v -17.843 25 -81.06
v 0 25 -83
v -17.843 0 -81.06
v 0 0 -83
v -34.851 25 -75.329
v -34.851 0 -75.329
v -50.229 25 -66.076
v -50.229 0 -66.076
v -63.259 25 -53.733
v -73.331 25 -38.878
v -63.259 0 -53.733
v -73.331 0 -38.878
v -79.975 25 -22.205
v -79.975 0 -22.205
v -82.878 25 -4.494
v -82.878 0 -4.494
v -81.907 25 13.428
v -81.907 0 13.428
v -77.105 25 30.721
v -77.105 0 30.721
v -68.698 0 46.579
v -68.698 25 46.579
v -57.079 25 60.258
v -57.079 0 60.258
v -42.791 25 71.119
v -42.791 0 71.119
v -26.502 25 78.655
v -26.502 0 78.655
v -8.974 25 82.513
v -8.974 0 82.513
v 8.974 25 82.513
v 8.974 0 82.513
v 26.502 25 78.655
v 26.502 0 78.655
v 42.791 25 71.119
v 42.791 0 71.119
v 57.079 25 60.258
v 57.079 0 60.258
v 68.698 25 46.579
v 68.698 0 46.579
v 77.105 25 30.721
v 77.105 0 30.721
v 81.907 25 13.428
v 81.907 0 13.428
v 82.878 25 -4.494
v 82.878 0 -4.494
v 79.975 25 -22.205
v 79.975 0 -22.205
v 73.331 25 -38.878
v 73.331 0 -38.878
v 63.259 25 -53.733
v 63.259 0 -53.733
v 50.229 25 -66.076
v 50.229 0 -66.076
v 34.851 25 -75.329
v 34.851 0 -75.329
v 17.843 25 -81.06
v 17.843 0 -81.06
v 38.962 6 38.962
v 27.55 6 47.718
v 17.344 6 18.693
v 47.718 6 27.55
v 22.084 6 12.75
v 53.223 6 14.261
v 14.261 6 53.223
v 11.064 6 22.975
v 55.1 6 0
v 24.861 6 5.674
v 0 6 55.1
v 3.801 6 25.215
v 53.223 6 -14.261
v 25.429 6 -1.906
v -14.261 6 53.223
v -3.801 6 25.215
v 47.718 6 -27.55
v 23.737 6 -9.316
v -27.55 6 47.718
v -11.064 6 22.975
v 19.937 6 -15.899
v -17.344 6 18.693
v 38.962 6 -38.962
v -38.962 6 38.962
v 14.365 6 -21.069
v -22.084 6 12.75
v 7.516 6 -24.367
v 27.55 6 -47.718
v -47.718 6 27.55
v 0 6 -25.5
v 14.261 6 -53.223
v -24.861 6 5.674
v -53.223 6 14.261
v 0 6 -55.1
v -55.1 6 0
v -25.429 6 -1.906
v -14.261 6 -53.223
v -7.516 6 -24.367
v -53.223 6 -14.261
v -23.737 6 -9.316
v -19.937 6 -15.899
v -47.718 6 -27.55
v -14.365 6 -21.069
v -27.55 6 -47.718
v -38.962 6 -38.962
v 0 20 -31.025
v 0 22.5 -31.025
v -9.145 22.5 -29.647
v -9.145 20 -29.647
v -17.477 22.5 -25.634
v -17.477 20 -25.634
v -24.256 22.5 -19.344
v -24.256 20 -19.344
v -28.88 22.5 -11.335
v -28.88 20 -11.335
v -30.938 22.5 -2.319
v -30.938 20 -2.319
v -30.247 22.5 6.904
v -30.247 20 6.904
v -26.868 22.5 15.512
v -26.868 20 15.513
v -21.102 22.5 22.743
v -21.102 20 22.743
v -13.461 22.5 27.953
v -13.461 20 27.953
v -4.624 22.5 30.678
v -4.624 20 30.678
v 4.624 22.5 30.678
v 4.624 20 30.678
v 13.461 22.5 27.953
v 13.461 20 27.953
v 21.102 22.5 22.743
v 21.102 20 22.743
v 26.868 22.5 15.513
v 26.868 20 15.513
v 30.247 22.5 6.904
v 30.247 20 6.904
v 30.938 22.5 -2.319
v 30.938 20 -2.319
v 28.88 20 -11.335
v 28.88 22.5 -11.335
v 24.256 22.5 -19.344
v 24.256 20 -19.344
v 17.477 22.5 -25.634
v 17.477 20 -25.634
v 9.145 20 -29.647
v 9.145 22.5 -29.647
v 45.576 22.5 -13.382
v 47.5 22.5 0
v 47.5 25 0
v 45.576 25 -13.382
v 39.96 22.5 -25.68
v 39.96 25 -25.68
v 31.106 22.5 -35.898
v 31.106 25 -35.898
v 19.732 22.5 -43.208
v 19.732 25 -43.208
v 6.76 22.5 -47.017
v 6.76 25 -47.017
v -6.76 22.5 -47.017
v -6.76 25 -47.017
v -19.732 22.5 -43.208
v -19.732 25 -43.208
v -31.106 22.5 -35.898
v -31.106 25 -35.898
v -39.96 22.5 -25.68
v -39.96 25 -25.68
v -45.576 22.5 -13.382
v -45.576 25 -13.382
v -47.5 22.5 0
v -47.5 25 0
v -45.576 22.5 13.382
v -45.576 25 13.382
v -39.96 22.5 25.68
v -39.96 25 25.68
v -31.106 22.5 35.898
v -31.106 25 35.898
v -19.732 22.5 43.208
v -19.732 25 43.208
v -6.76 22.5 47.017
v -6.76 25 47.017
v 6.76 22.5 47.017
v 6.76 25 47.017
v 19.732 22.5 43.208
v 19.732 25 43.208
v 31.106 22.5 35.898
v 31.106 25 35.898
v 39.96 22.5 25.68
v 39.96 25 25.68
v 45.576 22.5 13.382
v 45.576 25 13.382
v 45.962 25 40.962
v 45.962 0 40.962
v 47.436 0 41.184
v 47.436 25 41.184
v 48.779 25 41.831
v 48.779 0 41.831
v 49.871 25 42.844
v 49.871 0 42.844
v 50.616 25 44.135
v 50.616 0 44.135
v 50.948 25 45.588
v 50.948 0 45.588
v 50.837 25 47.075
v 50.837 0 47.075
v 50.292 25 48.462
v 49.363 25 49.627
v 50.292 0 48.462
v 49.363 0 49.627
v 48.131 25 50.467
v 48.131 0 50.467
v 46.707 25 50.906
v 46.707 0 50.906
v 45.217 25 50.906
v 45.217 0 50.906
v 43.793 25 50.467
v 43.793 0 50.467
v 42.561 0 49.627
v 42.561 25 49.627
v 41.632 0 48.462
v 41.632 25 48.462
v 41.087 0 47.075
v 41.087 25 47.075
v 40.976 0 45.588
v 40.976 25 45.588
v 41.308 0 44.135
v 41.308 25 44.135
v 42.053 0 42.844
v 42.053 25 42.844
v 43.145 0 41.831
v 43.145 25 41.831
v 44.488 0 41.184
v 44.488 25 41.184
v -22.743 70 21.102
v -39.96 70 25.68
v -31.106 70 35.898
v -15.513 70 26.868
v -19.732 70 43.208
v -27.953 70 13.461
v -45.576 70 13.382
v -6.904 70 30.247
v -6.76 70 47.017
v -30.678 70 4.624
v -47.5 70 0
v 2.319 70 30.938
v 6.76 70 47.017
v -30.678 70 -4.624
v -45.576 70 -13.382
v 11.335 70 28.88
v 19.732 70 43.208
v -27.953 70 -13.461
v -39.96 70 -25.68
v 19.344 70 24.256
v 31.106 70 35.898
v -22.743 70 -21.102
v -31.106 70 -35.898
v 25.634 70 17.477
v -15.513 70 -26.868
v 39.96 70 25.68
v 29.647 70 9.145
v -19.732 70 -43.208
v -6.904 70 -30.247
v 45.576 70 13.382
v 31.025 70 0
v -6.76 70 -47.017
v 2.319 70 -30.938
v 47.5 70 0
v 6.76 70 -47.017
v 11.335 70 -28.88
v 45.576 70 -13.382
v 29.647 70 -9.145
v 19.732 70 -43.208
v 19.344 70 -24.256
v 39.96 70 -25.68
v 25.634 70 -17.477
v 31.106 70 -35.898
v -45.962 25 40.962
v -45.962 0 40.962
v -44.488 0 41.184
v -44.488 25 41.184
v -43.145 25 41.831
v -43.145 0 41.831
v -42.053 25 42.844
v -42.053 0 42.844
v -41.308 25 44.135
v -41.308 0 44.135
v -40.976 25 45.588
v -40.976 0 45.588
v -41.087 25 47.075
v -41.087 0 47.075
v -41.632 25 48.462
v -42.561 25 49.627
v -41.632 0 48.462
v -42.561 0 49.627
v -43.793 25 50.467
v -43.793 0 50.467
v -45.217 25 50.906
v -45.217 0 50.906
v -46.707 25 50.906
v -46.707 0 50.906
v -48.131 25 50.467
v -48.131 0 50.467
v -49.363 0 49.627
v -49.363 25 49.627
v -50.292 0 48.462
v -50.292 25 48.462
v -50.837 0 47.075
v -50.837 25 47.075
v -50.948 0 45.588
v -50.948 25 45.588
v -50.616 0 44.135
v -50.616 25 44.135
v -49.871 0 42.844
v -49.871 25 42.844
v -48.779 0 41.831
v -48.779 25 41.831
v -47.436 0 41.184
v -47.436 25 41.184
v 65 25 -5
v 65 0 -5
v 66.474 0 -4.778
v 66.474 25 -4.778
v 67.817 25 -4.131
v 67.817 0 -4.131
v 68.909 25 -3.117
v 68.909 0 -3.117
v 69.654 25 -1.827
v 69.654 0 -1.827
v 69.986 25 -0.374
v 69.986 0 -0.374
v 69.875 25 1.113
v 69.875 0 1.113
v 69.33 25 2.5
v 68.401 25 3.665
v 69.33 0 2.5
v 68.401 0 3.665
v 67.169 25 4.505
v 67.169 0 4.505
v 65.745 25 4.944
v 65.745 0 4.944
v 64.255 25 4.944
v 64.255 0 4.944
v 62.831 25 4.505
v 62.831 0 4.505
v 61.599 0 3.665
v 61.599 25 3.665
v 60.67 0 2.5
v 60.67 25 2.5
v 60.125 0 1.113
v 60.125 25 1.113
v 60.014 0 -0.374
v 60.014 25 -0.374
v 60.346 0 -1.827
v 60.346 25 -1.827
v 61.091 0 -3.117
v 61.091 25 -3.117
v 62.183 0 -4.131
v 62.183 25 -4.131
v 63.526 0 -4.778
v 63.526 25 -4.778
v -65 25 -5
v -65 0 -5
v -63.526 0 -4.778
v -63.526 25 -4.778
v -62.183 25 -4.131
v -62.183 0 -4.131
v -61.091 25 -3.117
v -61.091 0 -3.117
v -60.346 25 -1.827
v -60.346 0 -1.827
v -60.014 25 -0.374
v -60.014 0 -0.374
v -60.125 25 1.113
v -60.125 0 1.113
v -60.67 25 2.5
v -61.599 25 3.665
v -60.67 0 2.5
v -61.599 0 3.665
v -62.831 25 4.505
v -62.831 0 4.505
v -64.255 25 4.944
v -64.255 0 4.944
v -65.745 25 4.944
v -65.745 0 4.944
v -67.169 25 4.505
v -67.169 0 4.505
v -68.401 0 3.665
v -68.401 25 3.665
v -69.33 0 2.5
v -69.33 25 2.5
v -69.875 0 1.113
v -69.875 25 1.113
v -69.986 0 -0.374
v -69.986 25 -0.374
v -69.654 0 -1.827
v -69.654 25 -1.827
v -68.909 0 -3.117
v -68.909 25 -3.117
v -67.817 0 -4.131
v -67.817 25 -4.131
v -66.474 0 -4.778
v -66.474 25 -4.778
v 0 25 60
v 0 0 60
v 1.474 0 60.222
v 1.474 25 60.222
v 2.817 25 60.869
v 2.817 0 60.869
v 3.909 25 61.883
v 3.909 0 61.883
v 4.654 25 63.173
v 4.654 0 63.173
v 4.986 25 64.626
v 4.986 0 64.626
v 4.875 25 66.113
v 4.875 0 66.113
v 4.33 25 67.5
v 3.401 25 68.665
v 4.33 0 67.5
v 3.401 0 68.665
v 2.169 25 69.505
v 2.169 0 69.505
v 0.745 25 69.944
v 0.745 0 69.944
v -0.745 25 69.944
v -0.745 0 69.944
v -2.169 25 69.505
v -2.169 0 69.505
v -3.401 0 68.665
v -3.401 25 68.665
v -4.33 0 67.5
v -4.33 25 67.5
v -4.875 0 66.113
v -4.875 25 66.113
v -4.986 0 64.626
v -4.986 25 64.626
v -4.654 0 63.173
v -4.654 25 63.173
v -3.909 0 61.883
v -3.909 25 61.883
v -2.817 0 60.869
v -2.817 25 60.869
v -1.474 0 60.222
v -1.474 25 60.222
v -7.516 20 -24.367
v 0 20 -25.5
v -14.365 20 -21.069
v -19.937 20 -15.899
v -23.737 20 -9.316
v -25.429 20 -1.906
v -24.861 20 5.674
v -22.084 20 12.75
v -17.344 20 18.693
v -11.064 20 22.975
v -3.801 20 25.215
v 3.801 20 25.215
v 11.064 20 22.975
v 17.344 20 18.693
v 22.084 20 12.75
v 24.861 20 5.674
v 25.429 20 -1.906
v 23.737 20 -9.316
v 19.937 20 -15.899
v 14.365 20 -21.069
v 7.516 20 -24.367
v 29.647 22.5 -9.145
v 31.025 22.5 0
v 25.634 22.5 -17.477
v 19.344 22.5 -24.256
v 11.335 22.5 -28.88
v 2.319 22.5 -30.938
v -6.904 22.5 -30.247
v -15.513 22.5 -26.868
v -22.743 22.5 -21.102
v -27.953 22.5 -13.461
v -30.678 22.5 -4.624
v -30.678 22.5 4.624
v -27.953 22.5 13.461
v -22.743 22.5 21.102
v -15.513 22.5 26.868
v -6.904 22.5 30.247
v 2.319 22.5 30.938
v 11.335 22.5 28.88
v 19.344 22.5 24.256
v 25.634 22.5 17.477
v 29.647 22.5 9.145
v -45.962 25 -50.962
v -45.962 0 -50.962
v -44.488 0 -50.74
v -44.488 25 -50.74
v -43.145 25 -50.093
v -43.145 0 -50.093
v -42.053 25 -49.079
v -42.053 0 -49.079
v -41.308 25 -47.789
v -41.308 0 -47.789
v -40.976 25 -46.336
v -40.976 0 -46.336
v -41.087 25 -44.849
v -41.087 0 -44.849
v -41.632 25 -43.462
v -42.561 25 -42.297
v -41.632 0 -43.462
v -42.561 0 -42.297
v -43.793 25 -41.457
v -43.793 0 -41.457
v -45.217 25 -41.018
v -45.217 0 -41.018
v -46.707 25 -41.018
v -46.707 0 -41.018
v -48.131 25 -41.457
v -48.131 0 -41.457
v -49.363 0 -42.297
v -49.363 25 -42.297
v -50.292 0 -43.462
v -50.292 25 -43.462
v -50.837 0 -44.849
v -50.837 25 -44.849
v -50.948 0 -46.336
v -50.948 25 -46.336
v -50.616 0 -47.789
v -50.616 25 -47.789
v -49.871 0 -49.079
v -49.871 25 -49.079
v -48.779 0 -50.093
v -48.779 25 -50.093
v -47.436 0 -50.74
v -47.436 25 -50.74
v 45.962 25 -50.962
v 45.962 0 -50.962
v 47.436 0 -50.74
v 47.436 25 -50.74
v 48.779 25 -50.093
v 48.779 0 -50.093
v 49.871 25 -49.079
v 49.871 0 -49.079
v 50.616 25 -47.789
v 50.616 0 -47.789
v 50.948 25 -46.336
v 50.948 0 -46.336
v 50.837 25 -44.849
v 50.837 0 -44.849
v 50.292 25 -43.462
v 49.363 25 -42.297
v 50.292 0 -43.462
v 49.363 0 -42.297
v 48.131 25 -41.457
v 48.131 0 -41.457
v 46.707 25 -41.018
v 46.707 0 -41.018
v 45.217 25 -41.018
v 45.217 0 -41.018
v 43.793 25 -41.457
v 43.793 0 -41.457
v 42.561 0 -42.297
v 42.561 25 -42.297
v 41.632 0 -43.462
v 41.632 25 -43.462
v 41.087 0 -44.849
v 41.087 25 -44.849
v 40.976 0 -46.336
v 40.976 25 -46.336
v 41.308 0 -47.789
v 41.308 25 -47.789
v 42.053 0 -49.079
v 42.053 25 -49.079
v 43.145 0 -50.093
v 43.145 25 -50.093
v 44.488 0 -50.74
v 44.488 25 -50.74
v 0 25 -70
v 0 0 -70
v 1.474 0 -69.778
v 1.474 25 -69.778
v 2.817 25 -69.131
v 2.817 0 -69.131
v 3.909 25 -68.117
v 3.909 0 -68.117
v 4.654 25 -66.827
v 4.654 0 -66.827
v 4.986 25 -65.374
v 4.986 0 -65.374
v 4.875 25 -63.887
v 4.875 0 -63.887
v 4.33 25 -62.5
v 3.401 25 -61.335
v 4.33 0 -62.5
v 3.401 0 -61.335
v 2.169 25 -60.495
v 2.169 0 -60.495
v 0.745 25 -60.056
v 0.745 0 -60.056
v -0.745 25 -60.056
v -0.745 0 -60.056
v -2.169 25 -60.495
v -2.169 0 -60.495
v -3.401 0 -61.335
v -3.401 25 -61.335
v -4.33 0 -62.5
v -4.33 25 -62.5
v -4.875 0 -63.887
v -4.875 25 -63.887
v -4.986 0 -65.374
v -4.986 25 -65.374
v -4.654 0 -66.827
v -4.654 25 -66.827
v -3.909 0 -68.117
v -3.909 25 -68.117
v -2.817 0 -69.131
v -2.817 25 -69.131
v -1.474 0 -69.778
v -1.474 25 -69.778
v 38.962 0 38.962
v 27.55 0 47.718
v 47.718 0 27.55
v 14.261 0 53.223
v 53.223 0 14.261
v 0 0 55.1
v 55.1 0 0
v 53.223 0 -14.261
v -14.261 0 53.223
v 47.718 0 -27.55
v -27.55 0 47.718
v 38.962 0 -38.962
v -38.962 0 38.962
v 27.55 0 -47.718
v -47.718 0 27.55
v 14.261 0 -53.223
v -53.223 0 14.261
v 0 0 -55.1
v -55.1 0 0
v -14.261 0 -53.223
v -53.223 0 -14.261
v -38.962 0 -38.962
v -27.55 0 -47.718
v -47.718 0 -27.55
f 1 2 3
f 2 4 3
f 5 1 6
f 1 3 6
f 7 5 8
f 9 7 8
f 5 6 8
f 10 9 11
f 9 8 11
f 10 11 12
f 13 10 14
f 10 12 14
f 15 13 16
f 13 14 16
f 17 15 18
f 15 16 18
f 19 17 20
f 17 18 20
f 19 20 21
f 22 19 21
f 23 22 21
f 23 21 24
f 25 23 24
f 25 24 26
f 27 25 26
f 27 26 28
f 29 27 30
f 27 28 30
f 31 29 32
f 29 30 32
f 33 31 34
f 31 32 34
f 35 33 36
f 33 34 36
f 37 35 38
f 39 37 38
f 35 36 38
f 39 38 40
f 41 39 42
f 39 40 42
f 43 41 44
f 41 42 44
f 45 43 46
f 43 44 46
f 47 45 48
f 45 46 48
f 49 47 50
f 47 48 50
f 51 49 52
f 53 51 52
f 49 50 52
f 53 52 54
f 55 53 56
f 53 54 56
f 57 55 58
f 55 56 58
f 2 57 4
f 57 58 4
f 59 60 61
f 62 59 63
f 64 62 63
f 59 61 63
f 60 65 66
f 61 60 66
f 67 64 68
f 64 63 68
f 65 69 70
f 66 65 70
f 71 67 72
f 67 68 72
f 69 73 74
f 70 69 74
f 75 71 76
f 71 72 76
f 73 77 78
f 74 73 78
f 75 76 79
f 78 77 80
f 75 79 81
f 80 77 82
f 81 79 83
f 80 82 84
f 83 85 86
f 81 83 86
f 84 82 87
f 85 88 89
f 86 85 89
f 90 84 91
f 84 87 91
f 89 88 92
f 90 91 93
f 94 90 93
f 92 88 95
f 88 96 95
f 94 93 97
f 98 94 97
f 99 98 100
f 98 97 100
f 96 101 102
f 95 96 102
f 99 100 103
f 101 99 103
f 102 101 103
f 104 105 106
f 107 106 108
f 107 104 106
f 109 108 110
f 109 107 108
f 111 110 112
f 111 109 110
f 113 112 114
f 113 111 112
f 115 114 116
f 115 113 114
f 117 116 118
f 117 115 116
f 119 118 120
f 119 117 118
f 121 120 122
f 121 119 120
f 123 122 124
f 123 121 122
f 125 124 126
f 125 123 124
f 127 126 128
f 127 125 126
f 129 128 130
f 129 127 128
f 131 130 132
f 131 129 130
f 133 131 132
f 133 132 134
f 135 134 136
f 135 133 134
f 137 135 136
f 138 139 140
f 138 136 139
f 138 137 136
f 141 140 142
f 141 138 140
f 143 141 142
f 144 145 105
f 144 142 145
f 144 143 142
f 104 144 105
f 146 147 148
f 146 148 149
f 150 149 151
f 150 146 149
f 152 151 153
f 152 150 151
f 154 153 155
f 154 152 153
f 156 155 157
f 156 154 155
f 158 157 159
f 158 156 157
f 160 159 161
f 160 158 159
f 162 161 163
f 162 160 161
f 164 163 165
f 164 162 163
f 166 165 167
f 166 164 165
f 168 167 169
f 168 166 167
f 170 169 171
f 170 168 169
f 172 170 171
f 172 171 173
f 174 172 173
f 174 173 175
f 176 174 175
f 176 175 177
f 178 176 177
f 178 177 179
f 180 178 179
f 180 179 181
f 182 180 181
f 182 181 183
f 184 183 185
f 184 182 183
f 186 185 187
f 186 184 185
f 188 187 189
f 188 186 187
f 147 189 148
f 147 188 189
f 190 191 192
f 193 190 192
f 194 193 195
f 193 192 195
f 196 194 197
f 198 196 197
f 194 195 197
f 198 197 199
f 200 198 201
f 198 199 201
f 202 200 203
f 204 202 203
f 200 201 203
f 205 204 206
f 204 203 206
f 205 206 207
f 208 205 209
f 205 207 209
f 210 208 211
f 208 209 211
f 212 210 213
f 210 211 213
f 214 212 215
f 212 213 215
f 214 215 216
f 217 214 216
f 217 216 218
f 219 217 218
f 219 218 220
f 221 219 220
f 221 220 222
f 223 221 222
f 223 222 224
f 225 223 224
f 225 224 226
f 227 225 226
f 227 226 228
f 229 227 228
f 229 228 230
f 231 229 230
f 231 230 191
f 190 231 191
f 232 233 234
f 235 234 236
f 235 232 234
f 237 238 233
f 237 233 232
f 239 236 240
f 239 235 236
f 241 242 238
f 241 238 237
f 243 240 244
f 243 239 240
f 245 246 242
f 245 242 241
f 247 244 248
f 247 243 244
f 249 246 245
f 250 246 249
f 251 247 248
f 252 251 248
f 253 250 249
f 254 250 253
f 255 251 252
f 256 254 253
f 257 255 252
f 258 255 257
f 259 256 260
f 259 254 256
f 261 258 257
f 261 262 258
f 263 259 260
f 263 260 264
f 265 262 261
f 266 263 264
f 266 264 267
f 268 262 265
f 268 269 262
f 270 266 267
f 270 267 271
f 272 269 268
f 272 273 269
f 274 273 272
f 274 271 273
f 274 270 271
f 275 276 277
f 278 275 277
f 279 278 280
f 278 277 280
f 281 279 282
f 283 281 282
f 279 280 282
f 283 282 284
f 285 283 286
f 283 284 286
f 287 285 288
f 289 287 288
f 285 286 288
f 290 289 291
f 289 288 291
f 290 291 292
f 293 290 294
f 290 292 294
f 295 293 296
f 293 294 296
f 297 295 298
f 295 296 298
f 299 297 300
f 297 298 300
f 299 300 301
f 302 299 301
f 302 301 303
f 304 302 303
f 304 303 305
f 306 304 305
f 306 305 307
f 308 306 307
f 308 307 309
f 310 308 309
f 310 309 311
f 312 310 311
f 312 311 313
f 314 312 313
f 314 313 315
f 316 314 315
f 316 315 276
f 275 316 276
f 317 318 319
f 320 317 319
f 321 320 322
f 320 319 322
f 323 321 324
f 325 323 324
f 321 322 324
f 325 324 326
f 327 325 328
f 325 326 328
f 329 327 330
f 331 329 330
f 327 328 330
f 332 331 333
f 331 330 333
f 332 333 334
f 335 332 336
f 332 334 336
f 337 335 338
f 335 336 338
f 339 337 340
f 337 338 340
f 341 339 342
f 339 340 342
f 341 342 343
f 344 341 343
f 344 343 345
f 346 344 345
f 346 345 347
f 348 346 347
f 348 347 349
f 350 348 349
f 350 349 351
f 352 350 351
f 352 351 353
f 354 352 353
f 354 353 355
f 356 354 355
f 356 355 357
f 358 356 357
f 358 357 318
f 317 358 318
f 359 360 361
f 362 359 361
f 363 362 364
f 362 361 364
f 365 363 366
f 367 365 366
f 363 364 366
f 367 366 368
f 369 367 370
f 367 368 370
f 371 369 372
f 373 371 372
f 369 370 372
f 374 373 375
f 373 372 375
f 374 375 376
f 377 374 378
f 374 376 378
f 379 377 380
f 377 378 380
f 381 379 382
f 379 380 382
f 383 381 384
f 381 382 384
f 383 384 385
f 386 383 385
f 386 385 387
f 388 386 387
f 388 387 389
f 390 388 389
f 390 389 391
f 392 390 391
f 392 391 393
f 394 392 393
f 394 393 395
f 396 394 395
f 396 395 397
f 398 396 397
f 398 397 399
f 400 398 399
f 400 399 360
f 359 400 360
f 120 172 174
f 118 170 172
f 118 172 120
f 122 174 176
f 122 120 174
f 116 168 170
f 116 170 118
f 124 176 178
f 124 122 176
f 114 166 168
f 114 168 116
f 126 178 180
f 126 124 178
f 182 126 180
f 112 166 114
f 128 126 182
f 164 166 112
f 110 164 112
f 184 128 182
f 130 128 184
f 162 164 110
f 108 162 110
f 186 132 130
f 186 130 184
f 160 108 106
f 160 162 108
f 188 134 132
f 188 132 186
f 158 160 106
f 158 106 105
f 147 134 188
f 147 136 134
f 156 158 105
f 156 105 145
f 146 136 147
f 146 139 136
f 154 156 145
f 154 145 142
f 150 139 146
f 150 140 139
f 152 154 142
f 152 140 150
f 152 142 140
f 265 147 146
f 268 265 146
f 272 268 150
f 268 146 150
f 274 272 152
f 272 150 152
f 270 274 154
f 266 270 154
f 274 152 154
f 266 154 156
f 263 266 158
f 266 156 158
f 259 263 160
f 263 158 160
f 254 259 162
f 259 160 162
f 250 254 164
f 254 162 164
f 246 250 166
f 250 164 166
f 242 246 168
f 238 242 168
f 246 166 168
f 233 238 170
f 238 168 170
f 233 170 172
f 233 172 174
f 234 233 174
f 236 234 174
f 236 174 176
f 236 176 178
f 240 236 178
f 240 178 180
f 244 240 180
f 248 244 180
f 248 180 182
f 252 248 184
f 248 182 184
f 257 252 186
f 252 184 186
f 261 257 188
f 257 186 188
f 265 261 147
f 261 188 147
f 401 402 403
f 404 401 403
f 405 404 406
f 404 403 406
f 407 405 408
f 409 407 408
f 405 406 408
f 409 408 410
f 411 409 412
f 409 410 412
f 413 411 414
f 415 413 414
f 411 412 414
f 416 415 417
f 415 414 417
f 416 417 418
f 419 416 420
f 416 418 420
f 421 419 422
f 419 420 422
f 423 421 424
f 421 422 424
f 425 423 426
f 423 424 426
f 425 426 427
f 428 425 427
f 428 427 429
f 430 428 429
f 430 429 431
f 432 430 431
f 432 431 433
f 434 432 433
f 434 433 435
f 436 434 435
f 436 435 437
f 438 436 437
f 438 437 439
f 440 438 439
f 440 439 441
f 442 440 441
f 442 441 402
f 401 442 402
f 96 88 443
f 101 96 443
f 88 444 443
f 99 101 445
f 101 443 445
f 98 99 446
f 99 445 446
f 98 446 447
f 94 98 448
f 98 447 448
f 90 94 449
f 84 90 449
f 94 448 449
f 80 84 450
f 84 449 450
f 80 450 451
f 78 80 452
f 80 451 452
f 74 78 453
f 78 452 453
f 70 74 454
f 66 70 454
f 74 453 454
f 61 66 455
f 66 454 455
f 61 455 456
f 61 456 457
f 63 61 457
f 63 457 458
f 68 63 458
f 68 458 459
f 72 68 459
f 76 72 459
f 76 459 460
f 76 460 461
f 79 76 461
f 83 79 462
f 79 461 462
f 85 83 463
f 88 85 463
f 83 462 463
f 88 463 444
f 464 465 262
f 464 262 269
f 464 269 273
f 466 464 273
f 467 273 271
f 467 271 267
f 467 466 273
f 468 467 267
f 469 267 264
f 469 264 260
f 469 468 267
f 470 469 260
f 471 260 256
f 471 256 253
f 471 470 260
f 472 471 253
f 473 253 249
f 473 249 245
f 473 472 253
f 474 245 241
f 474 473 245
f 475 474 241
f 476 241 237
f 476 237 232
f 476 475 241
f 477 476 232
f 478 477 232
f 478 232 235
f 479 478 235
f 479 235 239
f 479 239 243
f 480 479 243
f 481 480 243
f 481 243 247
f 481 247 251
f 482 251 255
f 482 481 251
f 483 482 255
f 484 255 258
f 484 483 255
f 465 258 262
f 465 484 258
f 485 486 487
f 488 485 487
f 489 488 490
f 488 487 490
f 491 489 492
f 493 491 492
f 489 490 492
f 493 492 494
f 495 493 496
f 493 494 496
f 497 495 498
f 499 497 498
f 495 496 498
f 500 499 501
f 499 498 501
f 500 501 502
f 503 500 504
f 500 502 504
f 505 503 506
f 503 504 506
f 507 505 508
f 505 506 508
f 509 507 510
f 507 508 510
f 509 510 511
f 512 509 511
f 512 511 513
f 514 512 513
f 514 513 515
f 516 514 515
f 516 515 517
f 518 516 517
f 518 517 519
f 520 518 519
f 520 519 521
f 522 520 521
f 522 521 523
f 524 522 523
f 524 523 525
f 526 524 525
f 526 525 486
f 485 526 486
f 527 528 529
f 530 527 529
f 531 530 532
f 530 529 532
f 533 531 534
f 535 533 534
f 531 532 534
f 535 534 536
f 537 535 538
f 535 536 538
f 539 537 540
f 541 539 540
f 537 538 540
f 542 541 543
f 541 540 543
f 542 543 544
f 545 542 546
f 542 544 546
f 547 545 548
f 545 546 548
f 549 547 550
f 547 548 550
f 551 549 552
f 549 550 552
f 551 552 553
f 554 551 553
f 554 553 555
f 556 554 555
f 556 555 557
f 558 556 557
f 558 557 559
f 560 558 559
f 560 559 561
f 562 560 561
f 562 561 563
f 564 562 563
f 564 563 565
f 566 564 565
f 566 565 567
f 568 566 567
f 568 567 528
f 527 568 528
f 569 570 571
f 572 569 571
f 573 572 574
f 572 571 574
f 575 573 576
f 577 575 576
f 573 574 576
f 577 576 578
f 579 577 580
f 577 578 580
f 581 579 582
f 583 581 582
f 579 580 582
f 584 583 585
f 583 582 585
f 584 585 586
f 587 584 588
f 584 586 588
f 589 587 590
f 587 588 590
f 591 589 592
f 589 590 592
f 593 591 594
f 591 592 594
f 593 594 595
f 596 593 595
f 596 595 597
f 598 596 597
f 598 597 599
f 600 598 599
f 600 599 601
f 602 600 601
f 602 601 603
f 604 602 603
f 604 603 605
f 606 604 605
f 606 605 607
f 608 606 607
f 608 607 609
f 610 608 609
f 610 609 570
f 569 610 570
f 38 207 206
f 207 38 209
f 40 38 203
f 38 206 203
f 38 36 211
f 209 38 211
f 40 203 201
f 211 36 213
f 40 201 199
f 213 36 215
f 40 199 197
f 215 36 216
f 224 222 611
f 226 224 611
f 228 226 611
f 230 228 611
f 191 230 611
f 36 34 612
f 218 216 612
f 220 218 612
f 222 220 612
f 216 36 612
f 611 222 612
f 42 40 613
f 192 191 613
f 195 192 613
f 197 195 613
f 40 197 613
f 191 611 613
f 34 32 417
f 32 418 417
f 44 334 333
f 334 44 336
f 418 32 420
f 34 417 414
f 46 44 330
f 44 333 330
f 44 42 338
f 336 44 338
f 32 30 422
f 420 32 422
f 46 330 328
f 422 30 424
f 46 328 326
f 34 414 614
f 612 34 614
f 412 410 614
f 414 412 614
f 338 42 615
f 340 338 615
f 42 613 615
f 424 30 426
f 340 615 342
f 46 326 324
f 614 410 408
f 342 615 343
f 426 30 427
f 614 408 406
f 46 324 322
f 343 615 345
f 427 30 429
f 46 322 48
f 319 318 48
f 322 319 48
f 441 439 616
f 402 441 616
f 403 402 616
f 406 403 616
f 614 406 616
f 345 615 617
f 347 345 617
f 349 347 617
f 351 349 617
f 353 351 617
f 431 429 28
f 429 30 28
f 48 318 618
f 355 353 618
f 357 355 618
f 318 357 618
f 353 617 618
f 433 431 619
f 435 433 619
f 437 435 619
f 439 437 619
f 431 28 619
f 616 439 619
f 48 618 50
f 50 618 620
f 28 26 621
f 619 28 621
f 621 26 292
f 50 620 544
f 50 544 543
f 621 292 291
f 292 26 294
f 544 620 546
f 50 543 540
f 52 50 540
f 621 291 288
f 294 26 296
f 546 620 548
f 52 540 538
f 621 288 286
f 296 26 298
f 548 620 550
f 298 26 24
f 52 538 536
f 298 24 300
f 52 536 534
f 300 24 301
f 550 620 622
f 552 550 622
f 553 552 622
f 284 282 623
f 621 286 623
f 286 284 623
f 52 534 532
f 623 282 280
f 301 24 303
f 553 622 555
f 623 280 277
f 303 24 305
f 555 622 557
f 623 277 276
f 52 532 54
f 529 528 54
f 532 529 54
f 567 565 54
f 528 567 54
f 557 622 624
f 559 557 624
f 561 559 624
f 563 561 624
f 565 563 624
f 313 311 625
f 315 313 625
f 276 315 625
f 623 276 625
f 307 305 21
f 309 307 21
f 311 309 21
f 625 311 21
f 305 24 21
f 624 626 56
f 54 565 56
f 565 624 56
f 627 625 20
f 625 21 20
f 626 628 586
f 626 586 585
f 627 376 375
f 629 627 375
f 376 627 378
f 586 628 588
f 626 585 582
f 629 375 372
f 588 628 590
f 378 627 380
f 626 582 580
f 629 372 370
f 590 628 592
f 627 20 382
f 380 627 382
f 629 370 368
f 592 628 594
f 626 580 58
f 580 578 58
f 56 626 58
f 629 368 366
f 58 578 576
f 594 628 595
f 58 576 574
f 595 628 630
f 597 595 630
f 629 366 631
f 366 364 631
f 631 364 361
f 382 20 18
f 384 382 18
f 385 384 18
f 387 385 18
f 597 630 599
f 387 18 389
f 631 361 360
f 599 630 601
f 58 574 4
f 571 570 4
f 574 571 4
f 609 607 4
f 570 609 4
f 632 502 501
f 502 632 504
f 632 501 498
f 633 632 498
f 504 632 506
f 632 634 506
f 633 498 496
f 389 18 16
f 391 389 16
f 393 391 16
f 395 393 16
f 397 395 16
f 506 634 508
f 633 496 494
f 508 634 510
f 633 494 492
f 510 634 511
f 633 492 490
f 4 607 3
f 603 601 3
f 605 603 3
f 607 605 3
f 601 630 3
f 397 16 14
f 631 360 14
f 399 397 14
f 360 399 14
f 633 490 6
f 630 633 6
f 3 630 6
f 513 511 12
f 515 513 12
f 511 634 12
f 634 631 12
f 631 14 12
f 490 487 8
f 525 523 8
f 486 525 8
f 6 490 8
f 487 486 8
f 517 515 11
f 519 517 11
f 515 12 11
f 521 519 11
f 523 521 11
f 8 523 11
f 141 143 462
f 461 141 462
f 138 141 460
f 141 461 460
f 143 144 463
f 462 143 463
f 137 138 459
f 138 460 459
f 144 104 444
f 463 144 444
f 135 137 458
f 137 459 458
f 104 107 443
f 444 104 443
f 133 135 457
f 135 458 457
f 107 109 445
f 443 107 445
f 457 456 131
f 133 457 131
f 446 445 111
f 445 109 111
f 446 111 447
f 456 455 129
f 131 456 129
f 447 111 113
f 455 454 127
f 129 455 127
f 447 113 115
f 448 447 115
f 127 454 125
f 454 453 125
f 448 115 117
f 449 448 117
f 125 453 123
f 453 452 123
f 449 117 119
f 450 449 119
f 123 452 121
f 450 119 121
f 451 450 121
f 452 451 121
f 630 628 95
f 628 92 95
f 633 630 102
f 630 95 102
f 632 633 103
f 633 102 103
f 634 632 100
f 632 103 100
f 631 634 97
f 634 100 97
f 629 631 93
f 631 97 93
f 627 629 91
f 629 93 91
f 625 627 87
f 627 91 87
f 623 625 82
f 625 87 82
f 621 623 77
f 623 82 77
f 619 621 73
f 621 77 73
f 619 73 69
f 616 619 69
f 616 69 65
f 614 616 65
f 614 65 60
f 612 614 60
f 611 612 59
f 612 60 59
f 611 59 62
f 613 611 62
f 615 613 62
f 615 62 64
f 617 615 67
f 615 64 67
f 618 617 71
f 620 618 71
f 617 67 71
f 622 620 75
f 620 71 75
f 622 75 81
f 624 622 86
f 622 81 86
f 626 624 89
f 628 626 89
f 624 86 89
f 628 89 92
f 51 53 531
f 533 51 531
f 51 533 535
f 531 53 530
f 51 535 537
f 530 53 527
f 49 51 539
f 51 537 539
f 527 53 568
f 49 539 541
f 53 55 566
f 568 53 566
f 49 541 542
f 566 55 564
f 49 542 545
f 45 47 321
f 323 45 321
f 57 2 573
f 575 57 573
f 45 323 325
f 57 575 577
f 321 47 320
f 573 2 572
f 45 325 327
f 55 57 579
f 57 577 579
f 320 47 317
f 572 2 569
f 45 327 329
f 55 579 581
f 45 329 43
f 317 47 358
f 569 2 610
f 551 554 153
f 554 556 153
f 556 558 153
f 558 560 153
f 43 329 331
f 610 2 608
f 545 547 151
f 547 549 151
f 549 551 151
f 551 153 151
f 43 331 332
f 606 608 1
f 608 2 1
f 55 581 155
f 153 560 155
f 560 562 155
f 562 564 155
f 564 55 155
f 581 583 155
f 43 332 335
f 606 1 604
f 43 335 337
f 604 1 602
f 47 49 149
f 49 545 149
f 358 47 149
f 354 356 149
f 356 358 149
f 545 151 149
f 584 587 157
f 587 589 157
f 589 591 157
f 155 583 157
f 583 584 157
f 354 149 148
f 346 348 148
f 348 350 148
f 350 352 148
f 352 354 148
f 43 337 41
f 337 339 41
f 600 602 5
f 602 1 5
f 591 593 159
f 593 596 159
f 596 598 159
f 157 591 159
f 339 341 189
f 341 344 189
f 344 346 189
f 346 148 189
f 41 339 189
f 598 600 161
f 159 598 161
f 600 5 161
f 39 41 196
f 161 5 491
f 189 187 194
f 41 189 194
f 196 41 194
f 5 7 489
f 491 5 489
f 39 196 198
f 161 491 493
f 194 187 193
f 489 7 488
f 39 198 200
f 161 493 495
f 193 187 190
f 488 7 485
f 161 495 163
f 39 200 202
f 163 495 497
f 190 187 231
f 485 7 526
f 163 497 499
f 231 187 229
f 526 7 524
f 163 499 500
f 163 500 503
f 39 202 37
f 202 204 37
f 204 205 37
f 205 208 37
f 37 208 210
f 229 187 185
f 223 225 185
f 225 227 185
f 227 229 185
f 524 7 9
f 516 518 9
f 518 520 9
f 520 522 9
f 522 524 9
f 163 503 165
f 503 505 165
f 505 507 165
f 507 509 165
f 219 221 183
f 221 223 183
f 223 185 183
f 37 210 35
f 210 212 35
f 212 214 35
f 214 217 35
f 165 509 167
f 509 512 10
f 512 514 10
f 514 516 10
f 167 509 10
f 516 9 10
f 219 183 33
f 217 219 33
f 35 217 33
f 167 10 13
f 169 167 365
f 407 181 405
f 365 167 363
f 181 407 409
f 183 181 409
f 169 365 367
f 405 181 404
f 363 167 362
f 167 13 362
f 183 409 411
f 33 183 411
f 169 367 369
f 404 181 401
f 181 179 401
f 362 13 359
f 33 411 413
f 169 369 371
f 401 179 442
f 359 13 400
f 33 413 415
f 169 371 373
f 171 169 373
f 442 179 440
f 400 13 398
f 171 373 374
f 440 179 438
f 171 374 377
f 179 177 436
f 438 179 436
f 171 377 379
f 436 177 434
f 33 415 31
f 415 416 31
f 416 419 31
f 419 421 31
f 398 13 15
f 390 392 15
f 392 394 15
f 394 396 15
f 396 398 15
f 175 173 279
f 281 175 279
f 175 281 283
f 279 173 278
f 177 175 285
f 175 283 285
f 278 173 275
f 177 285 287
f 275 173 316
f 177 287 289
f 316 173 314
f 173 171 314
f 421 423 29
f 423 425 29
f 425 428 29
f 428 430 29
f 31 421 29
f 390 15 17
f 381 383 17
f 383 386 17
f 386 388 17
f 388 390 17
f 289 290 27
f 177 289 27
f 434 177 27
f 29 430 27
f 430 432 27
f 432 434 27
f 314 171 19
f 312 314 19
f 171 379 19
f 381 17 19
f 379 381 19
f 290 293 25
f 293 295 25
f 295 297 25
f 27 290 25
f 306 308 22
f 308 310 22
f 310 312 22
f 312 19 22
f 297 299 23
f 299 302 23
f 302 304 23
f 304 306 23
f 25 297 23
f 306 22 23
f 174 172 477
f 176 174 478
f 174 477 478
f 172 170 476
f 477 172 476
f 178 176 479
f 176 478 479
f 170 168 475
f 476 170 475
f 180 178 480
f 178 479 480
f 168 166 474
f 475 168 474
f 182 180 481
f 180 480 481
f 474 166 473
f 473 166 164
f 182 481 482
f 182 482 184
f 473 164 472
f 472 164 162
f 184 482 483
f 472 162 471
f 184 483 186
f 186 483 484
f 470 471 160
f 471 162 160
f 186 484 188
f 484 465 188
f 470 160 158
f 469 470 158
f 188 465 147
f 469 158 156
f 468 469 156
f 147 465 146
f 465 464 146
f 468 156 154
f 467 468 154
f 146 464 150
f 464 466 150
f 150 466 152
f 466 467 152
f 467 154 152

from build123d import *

# Parameters (mm, degrees)
SKETCH3_R            = 5
CUT_EXTRUDE2_DEPTH   = 137.667479672
SPLIT1_START         = 22.5
SPLIT1_OUTLINE_R     = 47.5
SPLIT1_OUTLINE_R_2   = 31.025
SPLIT1_DEPTH         = 47.5
SPLIT1_2_OUTLINE_R   = 47.5
SPLIT1_2_OUTLINE_R_2 = 31.025
SPLIT1_2_DEPTH       = 47.5


# Read off the part's stored shape, not the designer's step: Split1
with BuildPart() as part:
    # Sketch2 → Revolve1 (revolve)
    with BuildSketch(Plane.XY, mode=Mode.PRIVATE) as revolve1_sk:
        Polygon((83, 0), (55.1, 0), (55.1, 6), (25.5, 6), (25.5, 20), (31.025, 20), (31.025, 36), (31.025, 70), (32.5, 70), (47.5, 70), (47.5, 25), (83, 25), align=None)
    revolve(revolve1_sk.sketch.rotate(Axis((0, 0, 0), (0, 1, 0)), 90), axis=Axis((0, 0, 0), (0, 1, 0)))

    # Sketch3 → Cut-Extrude2 (cut, through all)
    with BuildSketch(Plane.XZ):
        with Locations(Location((65, 0, 0), (0, 0, 270))):
            Circle(SKETCH3_R)
        with Locations(Location((45.961940777, -45.961940777, 0), (0, 0, 270))):
            Circle(SKETCH3_R)
        with Locations(Location((0, -65, 0), (0, 0, 270))):
            Circle(SKETCH3_R)
        with Locations(Location((-45.961940777, -45.961940777, 0), (0, 0, 270))):
            Circle(SKETCH3_R)
        with Locations(Location((-65, 0, 0), (0, 0, 270))):
            Circle(SKETCH3_R)
        with Locations(Location((-45.961940777, 45.961940777, 0), (0, 0, 270))):
            Circle(SKETCH3_R)
        with Locations(Location((0, 65, 0), (0, 0, 270))):
            Circle(SKETCH3_R)
        with Locations(Location((45.961940777, 45.961940777, 0), (0, 0, 270))):
            Circle(SKETCH3_R)
    extrude(amount=-CUT_EXTRUDE2_DEPTH, mode=Mode.SUBTRACT)

    # Split1 outline → Split1 (cut)
    with BuildSketch(Plane(origin=(0, 0, 0), x_dir=(1, 0, 0), z_dir=(0, 1, 0)).offset(SPLIT1_START)):
        Circle(SPLIT1_OUTLINE_R)
        Circle(SPLIT1_OUTLINE_R_2, mode=Mode.SUBTRACT)
    extrude(amount=SPLIT1_DEPTH, mode=Mode.SUBTRACT)


with BuildPart() as body_2:
    # Split1 2 outline → Split1 2 (new body)
    with BuildSketch(Plane(origin=(0, 0, 0), x_dir=(1, 0, 0), z_dir=(0, 1, 0)).offset(SPLIT1_START)):
        Circle(SPLIT1_2_OUTLINE_R)
        Circle(SPLIT1_2_OUTLINE_R_2, mode=Mode.SUBTRACT)
    extrude(amount=SPLIT1_2_DEPTH)


solid = Compound([part.part, body_2.part])
